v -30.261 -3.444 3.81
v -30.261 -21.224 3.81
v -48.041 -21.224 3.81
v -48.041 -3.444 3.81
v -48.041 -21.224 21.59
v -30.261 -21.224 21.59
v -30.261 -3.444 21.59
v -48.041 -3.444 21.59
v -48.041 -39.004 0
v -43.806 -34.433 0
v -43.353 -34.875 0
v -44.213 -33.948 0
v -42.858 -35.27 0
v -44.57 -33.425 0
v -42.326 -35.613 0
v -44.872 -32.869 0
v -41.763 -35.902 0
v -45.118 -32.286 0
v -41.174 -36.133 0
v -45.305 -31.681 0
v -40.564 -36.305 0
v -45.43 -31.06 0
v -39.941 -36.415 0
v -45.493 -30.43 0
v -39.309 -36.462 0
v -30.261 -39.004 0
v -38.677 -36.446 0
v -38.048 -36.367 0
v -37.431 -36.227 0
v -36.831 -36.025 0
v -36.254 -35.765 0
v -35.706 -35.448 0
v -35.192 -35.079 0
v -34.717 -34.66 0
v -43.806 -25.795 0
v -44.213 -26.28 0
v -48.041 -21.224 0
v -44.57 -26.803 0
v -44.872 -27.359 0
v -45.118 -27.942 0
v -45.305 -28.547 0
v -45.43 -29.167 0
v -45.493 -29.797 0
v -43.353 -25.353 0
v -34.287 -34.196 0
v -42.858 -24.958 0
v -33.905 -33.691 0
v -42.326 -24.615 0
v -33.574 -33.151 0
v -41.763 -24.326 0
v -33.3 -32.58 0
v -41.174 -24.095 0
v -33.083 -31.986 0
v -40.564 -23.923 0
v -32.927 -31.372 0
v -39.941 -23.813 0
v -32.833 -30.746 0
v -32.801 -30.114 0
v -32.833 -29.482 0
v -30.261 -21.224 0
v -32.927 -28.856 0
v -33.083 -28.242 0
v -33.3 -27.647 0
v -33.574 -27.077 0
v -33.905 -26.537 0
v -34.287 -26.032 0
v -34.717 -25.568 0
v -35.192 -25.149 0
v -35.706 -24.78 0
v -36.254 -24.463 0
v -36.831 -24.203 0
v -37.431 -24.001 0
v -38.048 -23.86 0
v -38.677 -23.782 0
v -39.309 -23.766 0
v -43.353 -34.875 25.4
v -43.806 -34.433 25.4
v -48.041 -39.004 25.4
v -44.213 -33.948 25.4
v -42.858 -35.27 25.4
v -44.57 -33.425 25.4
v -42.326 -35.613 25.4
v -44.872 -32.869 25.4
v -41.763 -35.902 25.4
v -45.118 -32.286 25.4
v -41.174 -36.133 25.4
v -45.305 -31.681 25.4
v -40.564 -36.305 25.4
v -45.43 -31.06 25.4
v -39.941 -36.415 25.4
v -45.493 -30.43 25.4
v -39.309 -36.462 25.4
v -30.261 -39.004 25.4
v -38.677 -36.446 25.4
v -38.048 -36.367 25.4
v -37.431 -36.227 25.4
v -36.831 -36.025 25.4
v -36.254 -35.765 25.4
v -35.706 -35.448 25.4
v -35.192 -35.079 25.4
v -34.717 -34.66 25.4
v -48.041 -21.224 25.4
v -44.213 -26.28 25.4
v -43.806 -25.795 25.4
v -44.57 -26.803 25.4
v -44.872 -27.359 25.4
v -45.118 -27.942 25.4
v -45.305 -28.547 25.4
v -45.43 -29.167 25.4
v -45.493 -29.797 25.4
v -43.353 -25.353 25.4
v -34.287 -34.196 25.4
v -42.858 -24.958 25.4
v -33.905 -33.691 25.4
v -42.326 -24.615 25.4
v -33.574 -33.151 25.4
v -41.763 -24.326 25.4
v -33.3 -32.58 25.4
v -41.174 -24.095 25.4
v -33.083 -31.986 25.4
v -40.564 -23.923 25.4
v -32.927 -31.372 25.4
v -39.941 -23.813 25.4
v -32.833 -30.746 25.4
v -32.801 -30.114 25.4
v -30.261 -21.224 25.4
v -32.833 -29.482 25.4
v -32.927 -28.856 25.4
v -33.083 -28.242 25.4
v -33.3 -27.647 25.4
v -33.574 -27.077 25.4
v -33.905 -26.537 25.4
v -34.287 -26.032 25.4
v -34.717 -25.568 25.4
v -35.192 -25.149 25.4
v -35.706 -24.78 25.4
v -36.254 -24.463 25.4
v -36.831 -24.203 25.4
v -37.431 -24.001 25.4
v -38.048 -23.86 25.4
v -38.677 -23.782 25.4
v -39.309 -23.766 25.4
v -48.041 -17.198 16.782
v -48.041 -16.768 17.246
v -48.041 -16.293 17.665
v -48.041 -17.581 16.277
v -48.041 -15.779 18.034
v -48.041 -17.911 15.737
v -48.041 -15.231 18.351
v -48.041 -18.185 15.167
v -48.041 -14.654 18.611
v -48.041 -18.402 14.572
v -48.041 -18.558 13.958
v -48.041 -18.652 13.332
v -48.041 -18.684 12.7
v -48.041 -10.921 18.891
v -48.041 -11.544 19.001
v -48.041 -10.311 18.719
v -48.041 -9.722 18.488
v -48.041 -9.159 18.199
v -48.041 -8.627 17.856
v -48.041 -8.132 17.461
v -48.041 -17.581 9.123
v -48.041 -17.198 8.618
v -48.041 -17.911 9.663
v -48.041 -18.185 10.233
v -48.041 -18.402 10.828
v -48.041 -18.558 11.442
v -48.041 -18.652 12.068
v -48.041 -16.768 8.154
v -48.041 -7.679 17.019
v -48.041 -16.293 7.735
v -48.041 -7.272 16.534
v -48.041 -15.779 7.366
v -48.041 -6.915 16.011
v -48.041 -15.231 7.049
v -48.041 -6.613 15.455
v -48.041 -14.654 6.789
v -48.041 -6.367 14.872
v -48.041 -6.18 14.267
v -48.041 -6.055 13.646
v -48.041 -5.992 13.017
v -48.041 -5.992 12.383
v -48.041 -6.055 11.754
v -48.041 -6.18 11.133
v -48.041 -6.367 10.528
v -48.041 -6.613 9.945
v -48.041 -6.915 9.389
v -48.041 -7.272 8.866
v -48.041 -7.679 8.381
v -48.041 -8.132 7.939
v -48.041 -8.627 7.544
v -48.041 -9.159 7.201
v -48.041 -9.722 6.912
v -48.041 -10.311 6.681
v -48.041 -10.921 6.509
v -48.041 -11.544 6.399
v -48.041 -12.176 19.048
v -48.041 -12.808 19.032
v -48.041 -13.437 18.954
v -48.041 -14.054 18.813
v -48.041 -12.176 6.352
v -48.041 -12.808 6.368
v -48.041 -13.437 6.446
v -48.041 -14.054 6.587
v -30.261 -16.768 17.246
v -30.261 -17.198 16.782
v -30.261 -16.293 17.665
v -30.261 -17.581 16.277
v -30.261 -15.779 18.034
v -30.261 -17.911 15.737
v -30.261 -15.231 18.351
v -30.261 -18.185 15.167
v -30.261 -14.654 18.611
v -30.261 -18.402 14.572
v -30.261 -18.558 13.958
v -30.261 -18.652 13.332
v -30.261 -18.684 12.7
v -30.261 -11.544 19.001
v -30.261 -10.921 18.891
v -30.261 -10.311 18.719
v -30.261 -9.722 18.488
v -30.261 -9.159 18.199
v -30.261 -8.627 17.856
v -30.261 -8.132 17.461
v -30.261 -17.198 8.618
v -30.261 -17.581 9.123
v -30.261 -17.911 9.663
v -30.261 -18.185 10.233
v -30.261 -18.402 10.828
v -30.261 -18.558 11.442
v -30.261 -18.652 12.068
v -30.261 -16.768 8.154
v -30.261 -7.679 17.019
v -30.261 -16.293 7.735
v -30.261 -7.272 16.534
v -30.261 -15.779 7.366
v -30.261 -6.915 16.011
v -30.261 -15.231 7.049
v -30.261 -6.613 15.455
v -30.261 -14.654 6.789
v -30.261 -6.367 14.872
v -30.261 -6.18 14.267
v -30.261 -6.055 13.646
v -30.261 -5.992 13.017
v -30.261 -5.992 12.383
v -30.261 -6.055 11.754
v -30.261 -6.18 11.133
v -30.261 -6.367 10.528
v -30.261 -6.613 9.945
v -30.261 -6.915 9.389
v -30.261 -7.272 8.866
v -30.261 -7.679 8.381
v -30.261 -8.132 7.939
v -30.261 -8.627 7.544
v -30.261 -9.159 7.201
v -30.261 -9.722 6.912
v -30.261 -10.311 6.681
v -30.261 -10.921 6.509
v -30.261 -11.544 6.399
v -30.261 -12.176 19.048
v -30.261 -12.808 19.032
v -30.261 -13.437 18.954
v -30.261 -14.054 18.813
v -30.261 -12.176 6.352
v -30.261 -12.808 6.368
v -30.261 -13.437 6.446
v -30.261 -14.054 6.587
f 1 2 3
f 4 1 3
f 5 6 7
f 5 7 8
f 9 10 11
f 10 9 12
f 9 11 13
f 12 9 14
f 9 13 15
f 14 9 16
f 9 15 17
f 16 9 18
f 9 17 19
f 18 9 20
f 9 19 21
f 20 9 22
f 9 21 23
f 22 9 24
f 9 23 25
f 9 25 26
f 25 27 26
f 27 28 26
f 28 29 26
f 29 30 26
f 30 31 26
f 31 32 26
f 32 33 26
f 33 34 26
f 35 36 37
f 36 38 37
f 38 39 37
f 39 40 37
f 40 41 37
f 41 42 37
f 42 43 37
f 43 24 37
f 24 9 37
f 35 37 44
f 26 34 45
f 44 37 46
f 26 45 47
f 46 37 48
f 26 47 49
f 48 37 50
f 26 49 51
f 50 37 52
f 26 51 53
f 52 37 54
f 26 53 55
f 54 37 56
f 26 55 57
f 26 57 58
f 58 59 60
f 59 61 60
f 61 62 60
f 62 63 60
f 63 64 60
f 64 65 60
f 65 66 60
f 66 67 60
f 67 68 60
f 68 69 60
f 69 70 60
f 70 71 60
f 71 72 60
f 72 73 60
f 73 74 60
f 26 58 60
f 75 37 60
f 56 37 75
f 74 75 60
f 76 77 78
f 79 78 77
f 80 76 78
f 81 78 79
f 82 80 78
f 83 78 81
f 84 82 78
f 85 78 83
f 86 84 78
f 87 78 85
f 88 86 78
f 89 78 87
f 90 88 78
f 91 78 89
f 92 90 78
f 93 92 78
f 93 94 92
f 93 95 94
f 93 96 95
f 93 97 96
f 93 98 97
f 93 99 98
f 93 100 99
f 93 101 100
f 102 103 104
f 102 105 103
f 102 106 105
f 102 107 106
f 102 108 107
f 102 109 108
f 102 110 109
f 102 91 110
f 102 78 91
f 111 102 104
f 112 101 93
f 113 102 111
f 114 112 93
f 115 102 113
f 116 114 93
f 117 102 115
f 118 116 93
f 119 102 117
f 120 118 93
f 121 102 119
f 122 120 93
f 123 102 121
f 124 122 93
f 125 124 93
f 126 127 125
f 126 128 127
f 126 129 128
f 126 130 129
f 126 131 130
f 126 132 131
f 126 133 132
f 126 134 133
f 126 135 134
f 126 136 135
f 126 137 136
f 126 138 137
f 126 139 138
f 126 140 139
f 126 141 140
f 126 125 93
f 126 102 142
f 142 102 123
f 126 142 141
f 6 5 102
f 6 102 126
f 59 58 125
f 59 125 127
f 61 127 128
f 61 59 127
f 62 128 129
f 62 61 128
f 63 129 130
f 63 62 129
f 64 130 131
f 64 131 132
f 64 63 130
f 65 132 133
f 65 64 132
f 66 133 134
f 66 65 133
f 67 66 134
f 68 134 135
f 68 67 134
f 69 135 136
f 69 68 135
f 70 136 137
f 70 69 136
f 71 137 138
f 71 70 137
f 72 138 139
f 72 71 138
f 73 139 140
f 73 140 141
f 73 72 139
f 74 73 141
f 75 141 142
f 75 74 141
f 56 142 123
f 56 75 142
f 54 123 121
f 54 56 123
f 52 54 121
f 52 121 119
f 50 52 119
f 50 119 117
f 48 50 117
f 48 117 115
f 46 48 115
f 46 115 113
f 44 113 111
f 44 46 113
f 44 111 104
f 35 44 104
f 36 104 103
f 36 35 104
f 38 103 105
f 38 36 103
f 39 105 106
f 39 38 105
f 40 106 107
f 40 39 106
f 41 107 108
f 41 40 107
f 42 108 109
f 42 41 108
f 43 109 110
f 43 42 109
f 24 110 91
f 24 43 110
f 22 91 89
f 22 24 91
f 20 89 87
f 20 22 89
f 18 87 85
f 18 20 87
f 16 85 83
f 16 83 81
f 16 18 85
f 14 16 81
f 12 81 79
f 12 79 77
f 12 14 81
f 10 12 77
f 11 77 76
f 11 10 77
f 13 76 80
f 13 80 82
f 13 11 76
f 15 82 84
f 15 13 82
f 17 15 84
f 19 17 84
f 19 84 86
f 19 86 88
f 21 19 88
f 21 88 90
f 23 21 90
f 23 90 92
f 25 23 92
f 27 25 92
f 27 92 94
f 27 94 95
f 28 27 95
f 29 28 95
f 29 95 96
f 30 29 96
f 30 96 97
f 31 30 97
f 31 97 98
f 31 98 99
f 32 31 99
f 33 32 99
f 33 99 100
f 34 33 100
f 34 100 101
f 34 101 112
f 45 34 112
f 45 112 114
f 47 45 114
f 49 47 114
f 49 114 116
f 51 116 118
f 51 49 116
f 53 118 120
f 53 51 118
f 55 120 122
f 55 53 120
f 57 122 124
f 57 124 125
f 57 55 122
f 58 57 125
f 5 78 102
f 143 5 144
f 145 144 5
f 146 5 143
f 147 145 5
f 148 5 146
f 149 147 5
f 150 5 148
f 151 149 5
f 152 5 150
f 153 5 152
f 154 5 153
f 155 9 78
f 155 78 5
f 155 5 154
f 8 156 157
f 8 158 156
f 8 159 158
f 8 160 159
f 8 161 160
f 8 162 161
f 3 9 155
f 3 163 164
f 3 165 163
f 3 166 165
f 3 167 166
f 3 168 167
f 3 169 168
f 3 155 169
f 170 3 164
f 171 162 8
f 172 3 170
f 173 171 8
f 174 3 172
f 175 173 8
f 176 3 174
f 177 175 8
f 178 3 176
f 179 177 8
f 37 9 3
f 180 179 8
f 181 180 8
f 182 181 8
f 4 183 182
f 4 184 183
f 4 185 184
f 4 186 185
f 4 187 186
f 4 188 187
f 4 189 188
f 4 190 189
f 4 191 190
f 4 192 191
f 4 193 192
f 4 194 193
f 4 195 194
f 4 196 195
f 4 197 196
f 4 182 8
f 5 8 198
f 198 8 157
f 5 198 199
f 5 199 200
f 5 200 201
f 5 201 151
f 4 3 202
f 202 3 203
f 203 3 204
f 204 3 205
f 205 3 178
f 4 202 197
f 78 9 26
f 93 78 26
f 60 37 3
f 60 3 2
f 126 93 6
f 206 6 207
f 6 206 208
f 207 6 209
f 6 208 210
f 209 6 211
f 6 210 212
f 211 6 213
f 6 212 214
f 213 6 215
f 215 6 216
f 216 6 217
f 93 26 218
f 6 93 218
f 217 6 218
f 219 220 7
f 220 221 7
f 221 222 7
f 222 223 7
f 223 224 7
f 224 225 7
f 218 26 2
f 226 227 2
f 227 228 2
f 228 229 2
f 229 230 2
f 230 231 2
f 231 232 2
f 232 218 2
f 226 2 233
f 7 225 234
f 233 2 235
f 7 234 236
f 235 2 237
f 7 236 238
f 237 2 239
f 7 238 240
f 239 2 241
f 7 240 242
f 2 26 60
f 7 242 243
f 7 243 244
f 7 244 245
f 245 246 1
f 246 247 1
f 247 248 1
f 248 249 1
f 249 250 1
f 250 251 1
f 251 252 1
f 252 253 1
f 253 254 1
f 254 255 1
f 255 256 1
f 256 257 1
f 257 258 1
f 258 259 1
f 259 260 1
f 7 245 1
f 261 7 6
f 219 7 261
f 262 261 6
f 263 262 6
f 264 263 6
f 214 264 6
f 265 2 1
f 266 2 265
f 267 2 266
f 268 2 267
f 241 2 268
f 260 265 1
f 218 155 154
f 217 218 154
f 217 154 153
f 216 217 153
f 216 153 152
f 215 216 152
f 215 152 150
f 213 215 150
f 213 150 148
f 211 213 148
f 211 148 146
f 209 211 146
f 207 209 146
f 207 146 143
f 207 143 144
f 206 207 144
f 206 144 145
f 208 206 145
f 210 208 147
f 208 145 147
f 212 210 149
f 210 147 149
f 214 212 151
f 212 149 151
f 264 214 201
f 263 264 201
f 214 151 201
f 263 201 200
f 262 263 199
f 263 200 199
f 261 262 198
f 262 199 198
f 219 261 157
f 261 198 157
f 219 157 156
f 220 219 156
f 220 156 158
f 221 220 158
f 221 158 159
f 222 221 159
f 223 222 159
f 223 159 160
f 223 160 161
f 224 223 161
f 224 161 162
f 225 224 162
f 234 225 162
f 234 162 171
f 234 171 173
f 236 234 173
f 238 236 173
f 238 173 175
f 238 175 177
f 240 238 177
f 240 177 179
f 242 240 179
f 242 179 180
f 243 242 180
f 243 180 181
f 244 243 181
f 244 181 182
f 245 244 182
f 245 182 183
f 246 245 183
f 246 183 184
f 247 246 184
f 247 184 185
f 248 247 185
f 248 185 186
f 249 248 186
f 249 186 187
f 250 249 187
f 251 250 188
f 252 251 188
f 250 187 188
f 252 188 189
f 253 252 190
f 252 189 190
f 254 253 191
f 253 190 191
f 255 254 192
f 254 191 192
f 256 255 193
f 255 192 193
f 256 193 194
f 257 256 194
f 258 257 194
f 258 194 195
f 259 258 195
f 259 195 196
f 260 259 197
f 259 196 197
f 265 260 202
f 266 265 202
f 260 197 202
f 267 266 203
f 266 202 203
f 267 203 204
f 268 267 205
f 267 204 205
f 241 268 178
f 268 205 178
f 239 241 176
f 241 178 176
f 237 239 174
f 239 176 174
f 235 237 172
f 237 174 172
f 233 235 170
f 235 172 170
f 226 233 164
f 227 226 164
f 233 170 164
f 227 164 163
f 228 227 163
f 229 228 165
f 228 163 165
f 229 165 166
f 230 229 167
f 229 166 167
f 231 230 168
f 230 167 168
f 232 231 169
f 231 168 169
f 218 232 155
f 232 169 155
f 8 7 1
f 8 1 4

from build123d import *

# Parameters (mm, degrees)
F0_W     = 17.78
F0_H     = 17.78
F0_R     = 6.35
F1_DEPTH = 25.4
F2_W     = 17.78
F2_H     = 17.78
F3_DEPTH = 17.78
F5_D     = 12.7
F5_DEPTH = 25.4


with BuildPart() as f1:
    # F0 (on Top) → F1 (new body)
    with BuildSketch(Plane.XY):
        with Locations((-39.151133, -30.113884)):
            Rectangle(F0_W, F0_H)
        with Locations((-39.151133, -30.113884)):
            Circle(F0_R, mode=Mode.SUBTRACT)
    extrude(amount=F1_DEPTH)

    # F2 (on face) → F3 (join)
    with BuildSketch(Plane(origin=(0, -21.223884, 0), x_dir=(-1, 0, 0), z_dir=(0, 1, 0))):
        with Locations((39.151133, 12.7)):
            Rectangle(F2_W, F2_H)
    extrude(amount=F3_DEPTH)

    # F5
    with Locations(Plane.YZ.offset(-30.261133)):
        with Locations((-12.333884, 12.7)):
            Hole(F5_D / 2, depth=F5_DEPTH)


solid = f1.part
